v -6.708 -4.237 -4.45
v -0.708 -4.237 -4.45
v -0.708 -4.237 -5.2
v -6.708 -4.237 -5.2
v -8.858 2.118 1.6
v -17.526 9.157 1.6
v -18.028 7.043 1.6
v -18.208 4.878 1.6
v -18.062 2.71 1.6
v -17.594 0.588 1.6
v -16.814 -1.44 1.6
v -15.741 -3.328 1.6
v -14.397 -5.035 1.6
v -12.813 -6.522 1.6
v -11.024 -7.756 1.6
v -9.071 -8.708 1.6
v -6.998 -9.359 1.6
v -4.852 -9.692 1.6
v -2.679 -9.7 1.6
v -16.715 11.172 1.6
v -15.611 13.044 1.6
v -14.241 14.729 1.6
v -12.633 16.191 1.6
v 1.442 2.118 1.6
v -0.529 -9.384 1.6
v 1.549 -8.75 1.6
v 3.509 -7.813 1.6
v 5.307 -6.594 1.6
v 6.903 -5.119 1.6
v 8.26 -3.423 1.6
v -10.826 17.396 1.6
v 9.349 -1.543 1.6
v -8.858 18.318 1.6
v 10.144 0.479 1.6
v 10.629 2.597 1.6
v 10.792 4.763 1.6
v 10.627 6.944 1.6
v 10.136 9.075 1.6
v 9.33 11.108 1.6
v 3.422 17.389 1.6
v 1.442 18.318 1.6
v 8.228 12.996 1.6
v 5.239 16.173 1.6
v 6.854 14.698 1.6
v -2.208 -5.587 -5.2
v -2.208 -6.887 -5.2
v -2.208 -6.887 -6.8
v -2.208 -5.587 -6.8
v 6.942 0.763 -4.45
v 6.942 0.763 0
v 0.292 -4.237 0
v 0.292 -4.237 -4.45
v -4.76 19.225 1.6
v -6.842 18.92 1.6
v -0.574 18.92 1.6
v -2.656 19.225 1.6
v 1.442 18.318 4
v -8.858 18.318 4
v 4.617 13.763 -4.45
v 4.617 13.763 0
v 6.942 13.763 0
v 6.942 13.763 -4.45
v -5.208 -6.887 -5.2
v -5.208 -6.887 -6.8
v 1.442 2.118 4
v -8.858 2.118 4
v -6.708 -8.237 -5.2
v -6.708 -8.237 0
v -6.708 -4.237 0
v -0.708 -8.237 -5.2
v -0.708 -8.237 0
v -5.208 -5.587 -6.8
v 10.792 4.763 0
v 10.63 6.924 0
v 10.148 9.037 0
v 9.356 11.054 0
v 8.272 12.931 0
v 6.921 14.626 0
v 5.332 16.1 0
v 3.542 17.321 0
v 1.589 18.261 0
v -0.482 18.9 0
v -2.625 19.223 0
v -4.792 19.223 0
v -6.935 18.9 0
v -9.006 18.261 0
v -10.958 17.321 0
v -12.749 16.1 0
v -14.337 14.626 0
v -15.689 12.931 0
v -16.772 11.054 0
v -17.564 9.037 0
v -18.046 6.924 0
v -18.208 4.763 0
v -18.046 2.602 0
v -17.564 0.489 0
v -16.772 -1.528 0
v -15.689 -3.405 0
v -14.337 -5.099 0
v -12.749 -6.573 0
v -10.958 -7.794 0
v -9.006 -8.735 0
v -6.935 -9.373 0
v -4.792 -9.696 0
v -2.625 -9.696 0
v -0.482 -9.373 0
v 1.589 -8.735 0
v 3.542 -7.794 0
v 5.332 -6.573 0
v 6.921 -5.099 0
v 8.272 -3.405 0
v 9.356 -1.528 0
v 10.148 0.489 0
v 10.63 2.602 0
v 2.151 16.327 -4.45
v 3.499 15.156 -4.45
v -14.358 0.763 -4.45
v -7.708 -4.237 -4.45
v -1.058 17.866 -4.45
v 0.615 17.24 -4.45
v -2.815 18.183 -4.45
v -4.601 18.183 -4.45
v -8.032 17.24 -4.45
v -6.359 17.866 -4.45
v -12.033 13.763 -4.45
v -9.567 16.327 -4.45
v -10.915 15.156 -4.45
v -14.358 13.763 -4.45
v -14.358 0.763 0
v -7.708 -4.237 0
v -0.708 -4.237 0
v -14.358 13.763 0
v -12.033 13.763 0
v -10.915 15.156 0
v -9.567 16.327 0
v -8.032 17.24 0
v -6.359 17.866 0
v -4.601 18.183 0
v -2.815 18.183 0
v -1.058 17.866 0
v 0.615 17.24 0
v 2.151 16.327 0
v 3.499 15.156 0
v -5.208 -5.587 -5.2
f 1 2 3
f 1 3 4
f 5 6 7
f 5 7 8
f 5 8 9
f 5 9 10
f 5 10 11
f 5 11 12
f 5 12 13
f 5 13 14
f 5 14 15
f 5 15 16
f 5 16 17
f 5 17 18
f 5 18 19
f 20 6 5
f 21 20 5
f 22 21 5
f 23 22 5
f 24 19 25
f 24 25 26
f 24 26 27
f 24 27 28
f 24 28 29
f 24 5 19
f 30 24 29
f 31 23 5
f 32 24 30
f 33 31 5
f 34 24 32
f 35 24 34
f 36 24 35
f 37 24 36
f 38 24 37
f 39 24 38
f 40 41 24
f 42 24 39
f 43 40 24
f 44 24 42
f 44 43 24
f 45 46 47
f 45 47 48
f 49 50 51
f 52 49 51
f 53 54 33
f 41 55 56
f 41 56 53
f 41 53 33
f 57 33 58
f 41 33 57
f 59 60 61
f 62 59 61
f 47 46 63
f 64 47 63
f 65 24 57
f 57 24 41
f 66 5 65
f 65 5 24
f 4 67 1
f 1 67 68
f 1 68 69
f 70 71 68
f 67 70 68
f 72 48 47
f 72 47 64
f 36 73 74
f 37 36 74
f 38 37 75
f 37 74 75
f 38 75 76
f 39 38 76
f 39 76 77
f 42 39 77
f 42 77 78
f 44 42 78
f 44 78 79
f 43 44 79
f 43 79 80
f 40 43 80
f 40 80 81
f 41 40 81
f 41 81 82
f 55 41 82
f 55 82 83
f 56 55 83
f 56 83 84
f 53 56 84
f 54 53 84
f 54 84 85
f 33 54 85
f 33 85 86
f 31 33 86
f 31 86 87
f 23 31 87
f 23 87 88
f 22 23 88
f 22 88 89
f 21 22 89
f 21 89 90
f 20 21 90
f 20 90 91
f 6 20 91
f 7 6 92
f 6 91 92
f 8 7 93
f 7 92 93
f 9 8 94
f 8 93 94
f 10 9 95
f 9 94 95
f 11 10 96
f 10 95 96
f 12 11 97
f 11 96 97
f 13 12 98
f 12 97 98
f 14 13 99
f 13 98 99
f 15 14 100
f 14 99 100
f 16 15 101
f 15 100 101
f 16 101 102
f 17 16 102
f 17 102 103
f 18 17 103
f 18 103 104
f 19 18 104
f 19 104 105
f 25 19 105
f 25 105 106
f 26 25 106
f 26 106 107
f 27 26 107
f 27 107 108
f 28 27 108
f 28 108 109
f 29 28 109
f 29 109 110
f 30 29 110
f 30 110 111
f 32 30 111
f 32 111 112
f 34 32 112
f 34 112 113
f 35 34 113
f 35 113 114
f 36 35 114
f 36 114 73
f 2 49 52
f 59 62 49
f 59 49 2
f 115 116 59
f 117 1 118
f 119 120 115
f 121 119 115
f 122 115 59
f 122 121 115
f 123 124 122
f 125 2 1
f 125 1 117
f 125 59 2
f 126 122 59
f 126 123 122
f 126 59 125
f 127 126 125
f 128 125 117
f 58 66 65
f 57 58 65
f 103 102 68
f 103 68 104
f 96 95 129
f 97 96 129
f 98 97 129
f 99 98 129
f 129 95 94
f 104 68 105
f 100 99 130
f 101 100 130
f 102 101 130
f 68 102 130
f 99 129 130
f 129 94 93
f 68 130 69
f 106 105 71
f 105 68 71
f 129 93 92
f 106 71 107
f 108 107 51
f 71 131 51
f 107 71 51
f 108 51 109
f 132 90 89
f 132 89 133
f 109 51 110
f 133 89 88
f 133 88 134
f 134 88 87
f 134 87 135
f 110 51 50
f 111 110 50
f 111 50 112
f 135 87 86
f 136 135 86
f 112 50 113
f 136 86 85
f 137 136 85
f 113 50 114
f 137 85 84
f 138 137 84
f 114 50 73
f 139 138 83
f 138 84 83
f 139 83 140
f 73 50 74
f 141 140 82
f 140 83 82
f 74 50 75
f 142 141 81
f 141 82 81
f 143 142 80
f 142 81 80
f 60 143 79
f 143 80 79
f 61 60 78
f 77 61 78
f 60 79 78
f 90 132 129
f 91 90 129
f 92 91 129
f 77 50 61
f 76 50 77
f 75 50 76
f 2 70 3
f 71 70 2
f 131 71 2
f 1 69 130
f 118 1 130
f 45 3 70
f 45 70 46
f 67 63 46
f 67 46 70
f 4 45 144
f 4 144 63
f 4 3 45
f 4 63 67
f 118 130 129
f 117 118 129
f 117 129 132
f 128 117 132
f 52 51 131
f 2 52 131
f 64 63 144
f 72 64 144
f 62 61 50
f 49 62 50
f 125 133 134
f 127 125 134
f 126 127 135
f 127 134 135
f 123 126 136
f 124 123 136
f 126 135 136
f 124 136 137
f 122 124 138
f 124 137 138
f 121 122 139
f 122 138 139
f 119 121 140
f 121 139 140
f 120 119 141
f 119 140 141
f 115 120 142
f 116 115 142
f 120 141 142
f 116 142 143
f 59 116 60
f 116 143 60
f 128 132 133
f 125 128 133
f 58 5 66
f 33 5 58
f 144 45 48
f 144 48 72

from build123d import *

# Parameters (mm, degrees)
ESQUISSE1_R        = 14.5
BOSS_EXTRU_1_DEPTH = 1.6
ESQUISSE2_W        = 10.3
ESQUISSE2_H        = 16.2
BOSS_EXTRU_2_DEPTH = 2.4
BOSS_EXTRU_3_DEPTH = 4.45
ESQUISSE4_W        = 6
ESQUISSE4_H        = 4
BOSS_EXTRU_4_DEPTH = 5.2
ESQUISSE5_W        = 3
ESQUISSE5_H        = 1.3
BOSS_EXTRU_5_DEPTH = 1.6


with BuildPart() as part:
    # Esquisse1 → Boss.-Extru.1 (new body)
    with BuildSketch(Plane.XY):
        with Locations((-3.708152602, 4.763148131)):
            Circle(ESQUISSE1_R)
    extrude(amount=BOSS_EXTRU_1_DEPTH)

    # Esquisse2 → Boss.-Extru.2 (add)
    with BuildSketch(Plane.XY.offset(1.6)):
        with Locations((-3.708152602, 10.217759892)):
            Rectangle(ESQUISSE2_W, ESQUISSE2_H)
    extrude(amount=BOSS_EXTRU_2_DEPTH)

    # Esquisse3 → Boss.-Extru.3 (add)
    with BuildSketch(Plane(origin=(0, 0, 0), x_dir=(-1, 0, 0), z_dir=(0, 0, -1))):
        with BuildLine():
            Line((7.708152602, -4.236851869), (14.358152602, 0.763148131))
            Line((14.358152602, 0.763148131), (14.358152602, 13.763148131))
            Line((14.358152602, 13.763148131), (12.033404554, 13.763148131))
            ThreePointArc((12.033404554, 13.763148131), (3.708152602, 18.223276297), (-4.617099351, 13.763148131))
            Line((-4.617099351, 13.763148131), (-6.941847398, 13.763148131))
            Line((-6.941847398, 13.763148131), (-6.941847398, 0.763148131))
            Line((-6.941847398, 0.763148131), (-0.291847398, -4.236851869))
            Line((-0.291847398, -4.236851869), (7.708152602, -4.236851869))
        make_face()
    extrude(amount=BOSS_EXTRU_3_DEPTH)

    # Esquisse4 → Boss.-Extru.4 (add)
    with BuildSketch(Plane(origin=(0, 0, 0), x_dir=(-1, 0, 0), z_dir=(0, 0, -1))):
        with Locations((3.708152602, -6.236851869)):
            Rectangle(ESQUISSE4_W, ESQUISSE4_H)
    extrude(amount=BOSS_EXTRU_4_DEPTH)

    # Esquisse5 → Boss.-Extru.5 (add)
    with BuildSketch(Plane(origin=(0, 0, -5.2), x_dir=(-1, 0, 0), z_dir=(0, 0, -1))):
        with Locations((3.708152602, -6.236851869)):
            Rectangle(ESQUISSE5_W, ESQUISSE5_H)
    extrude(amount=BOSS_EXTRU_5_DEPTH)


solid = part.part
